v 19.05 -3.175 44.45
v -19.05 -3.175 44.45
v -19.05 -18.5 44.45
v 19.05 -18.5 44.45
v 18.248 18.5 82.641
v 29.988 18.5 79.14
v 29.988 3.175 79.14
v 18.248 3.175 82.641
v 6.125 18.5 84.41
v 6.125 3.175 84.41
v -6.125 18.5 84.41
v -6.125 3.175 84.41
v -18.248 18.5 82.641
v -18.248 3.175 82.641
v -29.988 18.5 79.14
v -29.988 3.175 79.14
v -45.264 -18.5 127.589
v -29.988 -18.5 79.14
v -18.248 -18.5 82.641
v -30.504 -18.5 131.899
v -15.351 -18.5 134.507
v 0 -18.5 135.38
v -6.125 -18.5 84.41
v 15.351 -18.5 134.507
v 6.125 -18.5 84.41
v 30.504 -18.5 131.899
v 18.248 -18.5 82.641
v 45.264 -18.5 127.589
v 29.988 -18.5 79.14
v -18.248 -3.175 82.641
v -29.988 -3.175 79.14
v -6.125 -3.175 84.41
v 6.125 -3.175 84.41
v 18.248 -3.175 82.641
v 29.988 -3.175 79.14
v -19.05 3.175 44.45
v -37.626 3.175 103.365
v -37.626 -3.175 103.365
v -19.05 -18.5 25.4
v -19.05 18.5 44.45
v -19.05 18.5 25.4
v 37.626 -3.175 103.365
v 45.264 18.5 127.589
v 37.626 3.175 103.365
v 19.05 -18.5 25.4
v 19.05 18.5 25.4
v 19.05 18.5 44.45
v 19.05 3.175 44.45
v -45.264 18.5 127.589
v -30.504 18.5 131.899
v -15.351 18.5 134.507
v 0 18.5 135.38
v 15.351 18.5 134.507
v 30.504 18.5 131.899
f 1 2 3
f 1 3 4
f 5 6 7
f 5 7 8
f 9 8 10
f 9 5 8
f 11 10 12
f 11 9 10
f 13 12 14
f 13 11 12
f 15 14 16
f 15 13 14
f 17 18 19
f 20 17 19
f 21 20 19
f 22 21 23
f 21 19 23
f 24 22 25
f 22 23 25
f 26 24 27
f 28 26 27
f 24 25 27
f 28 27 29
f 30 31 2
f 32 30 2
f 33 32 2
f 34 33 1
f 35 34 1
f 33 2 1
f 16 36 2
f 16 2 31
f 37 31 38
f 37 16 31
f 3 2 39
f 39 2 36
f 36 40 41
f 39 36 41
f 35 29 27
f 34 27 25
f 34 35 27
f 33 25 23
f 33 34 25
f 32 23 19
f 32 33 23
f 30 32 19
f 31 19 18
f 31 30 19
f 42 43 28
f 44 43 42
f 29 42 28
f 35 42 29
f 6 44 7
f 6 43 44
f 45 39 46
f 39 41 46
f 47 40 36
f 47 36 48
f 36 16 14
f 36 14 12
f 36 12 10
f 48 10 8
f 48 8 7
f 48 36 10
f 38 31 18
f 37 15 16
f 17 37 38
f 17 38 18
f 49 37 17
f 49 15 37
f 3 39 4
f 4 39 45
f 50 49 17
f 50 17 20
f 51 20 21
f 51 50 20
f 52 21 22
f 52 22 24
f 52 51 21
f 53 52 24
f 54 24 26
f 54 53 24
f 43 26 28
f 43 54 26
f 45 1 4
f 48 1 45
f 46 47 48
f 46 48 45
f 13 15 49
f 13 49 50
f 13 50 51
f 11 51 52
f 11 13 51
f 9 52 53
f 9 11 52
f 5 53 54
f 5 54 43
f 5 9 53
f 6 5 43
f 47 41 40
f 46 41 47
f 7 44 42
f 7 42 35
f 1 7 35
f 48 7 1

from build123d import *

# Parameters (mm, degrees)
SKETCH1_W           = 38.1
SKETCH1_H           = 19.05
BOSS_EXTRUDE1_DEPTH = 18.5
BOSS_EXTRUDE3_DEPTH = 3.175
BOSS_EXTRUDE4_DEPTH = 18.5


with BuildPart() as part:
    # Sketch1 → Boss-Extrude1 (new body, symmetric)
    with BuildSketch(Plane(origin=(0, 0, 0), x_dir=(1, 0, 0), z_dir=(0, 1, 0))):
        with Locations((0, -34.925)):
            Rectangle(SKETCH1_W, SKETCH1_H)
    extrude(amount=BOSS_EXTRUDE1_DEPTH, both=True)

    # Sketch4 → Boss-Extrude3 (add, symmetric)
    with BuildSketch(Plane(origin=(0, 0, 0), x_dir=(1, 0, 0), z_dir=(0, 1, 0))):
        with BuildLine():
            Line((-19.05, -44.45), (-37.625792344, -103.364886448))
            ThreePointArc((-37.625792344, -103.364886448), (0, -110), (37.625792344, -103.364886448))
            Line((37.625792344, -103.364886448), (19.05, -44.45))
            Line((19.05, -44.45), (-19.05, -44.45))
        make_face()
    extrude(amount=BOSS_EXTRUDE3_DEPTH, both=True)

    # Sketch7 → Boss-Extrude4 (add, symmetric)
    with BuildSketch(Plane(origin=(0, 0, 0), x_dir=(1, 0, 0), z_dir=(0, 1, 0))):
        with BuildLine():
            Line((-29.987865037, -79.140475899), (-45.263719652, -127.589296997))
            ThreePointArc((-45.263719652, -127.589296997), (0, -135.380327319), (45.263719652, -127.589296997))
            Line((45.263719652, -127.589296997), (29.987865037, -79.140475899))
            ThreePointArc((29.987865037, -79.140475899), (0, -84.631477448), (-29.987865037, -79.140475899))
        make_face()
    extrude(amount=BOSS_EXTRUDE4_DEPTH, both=True)


solid = part.part
